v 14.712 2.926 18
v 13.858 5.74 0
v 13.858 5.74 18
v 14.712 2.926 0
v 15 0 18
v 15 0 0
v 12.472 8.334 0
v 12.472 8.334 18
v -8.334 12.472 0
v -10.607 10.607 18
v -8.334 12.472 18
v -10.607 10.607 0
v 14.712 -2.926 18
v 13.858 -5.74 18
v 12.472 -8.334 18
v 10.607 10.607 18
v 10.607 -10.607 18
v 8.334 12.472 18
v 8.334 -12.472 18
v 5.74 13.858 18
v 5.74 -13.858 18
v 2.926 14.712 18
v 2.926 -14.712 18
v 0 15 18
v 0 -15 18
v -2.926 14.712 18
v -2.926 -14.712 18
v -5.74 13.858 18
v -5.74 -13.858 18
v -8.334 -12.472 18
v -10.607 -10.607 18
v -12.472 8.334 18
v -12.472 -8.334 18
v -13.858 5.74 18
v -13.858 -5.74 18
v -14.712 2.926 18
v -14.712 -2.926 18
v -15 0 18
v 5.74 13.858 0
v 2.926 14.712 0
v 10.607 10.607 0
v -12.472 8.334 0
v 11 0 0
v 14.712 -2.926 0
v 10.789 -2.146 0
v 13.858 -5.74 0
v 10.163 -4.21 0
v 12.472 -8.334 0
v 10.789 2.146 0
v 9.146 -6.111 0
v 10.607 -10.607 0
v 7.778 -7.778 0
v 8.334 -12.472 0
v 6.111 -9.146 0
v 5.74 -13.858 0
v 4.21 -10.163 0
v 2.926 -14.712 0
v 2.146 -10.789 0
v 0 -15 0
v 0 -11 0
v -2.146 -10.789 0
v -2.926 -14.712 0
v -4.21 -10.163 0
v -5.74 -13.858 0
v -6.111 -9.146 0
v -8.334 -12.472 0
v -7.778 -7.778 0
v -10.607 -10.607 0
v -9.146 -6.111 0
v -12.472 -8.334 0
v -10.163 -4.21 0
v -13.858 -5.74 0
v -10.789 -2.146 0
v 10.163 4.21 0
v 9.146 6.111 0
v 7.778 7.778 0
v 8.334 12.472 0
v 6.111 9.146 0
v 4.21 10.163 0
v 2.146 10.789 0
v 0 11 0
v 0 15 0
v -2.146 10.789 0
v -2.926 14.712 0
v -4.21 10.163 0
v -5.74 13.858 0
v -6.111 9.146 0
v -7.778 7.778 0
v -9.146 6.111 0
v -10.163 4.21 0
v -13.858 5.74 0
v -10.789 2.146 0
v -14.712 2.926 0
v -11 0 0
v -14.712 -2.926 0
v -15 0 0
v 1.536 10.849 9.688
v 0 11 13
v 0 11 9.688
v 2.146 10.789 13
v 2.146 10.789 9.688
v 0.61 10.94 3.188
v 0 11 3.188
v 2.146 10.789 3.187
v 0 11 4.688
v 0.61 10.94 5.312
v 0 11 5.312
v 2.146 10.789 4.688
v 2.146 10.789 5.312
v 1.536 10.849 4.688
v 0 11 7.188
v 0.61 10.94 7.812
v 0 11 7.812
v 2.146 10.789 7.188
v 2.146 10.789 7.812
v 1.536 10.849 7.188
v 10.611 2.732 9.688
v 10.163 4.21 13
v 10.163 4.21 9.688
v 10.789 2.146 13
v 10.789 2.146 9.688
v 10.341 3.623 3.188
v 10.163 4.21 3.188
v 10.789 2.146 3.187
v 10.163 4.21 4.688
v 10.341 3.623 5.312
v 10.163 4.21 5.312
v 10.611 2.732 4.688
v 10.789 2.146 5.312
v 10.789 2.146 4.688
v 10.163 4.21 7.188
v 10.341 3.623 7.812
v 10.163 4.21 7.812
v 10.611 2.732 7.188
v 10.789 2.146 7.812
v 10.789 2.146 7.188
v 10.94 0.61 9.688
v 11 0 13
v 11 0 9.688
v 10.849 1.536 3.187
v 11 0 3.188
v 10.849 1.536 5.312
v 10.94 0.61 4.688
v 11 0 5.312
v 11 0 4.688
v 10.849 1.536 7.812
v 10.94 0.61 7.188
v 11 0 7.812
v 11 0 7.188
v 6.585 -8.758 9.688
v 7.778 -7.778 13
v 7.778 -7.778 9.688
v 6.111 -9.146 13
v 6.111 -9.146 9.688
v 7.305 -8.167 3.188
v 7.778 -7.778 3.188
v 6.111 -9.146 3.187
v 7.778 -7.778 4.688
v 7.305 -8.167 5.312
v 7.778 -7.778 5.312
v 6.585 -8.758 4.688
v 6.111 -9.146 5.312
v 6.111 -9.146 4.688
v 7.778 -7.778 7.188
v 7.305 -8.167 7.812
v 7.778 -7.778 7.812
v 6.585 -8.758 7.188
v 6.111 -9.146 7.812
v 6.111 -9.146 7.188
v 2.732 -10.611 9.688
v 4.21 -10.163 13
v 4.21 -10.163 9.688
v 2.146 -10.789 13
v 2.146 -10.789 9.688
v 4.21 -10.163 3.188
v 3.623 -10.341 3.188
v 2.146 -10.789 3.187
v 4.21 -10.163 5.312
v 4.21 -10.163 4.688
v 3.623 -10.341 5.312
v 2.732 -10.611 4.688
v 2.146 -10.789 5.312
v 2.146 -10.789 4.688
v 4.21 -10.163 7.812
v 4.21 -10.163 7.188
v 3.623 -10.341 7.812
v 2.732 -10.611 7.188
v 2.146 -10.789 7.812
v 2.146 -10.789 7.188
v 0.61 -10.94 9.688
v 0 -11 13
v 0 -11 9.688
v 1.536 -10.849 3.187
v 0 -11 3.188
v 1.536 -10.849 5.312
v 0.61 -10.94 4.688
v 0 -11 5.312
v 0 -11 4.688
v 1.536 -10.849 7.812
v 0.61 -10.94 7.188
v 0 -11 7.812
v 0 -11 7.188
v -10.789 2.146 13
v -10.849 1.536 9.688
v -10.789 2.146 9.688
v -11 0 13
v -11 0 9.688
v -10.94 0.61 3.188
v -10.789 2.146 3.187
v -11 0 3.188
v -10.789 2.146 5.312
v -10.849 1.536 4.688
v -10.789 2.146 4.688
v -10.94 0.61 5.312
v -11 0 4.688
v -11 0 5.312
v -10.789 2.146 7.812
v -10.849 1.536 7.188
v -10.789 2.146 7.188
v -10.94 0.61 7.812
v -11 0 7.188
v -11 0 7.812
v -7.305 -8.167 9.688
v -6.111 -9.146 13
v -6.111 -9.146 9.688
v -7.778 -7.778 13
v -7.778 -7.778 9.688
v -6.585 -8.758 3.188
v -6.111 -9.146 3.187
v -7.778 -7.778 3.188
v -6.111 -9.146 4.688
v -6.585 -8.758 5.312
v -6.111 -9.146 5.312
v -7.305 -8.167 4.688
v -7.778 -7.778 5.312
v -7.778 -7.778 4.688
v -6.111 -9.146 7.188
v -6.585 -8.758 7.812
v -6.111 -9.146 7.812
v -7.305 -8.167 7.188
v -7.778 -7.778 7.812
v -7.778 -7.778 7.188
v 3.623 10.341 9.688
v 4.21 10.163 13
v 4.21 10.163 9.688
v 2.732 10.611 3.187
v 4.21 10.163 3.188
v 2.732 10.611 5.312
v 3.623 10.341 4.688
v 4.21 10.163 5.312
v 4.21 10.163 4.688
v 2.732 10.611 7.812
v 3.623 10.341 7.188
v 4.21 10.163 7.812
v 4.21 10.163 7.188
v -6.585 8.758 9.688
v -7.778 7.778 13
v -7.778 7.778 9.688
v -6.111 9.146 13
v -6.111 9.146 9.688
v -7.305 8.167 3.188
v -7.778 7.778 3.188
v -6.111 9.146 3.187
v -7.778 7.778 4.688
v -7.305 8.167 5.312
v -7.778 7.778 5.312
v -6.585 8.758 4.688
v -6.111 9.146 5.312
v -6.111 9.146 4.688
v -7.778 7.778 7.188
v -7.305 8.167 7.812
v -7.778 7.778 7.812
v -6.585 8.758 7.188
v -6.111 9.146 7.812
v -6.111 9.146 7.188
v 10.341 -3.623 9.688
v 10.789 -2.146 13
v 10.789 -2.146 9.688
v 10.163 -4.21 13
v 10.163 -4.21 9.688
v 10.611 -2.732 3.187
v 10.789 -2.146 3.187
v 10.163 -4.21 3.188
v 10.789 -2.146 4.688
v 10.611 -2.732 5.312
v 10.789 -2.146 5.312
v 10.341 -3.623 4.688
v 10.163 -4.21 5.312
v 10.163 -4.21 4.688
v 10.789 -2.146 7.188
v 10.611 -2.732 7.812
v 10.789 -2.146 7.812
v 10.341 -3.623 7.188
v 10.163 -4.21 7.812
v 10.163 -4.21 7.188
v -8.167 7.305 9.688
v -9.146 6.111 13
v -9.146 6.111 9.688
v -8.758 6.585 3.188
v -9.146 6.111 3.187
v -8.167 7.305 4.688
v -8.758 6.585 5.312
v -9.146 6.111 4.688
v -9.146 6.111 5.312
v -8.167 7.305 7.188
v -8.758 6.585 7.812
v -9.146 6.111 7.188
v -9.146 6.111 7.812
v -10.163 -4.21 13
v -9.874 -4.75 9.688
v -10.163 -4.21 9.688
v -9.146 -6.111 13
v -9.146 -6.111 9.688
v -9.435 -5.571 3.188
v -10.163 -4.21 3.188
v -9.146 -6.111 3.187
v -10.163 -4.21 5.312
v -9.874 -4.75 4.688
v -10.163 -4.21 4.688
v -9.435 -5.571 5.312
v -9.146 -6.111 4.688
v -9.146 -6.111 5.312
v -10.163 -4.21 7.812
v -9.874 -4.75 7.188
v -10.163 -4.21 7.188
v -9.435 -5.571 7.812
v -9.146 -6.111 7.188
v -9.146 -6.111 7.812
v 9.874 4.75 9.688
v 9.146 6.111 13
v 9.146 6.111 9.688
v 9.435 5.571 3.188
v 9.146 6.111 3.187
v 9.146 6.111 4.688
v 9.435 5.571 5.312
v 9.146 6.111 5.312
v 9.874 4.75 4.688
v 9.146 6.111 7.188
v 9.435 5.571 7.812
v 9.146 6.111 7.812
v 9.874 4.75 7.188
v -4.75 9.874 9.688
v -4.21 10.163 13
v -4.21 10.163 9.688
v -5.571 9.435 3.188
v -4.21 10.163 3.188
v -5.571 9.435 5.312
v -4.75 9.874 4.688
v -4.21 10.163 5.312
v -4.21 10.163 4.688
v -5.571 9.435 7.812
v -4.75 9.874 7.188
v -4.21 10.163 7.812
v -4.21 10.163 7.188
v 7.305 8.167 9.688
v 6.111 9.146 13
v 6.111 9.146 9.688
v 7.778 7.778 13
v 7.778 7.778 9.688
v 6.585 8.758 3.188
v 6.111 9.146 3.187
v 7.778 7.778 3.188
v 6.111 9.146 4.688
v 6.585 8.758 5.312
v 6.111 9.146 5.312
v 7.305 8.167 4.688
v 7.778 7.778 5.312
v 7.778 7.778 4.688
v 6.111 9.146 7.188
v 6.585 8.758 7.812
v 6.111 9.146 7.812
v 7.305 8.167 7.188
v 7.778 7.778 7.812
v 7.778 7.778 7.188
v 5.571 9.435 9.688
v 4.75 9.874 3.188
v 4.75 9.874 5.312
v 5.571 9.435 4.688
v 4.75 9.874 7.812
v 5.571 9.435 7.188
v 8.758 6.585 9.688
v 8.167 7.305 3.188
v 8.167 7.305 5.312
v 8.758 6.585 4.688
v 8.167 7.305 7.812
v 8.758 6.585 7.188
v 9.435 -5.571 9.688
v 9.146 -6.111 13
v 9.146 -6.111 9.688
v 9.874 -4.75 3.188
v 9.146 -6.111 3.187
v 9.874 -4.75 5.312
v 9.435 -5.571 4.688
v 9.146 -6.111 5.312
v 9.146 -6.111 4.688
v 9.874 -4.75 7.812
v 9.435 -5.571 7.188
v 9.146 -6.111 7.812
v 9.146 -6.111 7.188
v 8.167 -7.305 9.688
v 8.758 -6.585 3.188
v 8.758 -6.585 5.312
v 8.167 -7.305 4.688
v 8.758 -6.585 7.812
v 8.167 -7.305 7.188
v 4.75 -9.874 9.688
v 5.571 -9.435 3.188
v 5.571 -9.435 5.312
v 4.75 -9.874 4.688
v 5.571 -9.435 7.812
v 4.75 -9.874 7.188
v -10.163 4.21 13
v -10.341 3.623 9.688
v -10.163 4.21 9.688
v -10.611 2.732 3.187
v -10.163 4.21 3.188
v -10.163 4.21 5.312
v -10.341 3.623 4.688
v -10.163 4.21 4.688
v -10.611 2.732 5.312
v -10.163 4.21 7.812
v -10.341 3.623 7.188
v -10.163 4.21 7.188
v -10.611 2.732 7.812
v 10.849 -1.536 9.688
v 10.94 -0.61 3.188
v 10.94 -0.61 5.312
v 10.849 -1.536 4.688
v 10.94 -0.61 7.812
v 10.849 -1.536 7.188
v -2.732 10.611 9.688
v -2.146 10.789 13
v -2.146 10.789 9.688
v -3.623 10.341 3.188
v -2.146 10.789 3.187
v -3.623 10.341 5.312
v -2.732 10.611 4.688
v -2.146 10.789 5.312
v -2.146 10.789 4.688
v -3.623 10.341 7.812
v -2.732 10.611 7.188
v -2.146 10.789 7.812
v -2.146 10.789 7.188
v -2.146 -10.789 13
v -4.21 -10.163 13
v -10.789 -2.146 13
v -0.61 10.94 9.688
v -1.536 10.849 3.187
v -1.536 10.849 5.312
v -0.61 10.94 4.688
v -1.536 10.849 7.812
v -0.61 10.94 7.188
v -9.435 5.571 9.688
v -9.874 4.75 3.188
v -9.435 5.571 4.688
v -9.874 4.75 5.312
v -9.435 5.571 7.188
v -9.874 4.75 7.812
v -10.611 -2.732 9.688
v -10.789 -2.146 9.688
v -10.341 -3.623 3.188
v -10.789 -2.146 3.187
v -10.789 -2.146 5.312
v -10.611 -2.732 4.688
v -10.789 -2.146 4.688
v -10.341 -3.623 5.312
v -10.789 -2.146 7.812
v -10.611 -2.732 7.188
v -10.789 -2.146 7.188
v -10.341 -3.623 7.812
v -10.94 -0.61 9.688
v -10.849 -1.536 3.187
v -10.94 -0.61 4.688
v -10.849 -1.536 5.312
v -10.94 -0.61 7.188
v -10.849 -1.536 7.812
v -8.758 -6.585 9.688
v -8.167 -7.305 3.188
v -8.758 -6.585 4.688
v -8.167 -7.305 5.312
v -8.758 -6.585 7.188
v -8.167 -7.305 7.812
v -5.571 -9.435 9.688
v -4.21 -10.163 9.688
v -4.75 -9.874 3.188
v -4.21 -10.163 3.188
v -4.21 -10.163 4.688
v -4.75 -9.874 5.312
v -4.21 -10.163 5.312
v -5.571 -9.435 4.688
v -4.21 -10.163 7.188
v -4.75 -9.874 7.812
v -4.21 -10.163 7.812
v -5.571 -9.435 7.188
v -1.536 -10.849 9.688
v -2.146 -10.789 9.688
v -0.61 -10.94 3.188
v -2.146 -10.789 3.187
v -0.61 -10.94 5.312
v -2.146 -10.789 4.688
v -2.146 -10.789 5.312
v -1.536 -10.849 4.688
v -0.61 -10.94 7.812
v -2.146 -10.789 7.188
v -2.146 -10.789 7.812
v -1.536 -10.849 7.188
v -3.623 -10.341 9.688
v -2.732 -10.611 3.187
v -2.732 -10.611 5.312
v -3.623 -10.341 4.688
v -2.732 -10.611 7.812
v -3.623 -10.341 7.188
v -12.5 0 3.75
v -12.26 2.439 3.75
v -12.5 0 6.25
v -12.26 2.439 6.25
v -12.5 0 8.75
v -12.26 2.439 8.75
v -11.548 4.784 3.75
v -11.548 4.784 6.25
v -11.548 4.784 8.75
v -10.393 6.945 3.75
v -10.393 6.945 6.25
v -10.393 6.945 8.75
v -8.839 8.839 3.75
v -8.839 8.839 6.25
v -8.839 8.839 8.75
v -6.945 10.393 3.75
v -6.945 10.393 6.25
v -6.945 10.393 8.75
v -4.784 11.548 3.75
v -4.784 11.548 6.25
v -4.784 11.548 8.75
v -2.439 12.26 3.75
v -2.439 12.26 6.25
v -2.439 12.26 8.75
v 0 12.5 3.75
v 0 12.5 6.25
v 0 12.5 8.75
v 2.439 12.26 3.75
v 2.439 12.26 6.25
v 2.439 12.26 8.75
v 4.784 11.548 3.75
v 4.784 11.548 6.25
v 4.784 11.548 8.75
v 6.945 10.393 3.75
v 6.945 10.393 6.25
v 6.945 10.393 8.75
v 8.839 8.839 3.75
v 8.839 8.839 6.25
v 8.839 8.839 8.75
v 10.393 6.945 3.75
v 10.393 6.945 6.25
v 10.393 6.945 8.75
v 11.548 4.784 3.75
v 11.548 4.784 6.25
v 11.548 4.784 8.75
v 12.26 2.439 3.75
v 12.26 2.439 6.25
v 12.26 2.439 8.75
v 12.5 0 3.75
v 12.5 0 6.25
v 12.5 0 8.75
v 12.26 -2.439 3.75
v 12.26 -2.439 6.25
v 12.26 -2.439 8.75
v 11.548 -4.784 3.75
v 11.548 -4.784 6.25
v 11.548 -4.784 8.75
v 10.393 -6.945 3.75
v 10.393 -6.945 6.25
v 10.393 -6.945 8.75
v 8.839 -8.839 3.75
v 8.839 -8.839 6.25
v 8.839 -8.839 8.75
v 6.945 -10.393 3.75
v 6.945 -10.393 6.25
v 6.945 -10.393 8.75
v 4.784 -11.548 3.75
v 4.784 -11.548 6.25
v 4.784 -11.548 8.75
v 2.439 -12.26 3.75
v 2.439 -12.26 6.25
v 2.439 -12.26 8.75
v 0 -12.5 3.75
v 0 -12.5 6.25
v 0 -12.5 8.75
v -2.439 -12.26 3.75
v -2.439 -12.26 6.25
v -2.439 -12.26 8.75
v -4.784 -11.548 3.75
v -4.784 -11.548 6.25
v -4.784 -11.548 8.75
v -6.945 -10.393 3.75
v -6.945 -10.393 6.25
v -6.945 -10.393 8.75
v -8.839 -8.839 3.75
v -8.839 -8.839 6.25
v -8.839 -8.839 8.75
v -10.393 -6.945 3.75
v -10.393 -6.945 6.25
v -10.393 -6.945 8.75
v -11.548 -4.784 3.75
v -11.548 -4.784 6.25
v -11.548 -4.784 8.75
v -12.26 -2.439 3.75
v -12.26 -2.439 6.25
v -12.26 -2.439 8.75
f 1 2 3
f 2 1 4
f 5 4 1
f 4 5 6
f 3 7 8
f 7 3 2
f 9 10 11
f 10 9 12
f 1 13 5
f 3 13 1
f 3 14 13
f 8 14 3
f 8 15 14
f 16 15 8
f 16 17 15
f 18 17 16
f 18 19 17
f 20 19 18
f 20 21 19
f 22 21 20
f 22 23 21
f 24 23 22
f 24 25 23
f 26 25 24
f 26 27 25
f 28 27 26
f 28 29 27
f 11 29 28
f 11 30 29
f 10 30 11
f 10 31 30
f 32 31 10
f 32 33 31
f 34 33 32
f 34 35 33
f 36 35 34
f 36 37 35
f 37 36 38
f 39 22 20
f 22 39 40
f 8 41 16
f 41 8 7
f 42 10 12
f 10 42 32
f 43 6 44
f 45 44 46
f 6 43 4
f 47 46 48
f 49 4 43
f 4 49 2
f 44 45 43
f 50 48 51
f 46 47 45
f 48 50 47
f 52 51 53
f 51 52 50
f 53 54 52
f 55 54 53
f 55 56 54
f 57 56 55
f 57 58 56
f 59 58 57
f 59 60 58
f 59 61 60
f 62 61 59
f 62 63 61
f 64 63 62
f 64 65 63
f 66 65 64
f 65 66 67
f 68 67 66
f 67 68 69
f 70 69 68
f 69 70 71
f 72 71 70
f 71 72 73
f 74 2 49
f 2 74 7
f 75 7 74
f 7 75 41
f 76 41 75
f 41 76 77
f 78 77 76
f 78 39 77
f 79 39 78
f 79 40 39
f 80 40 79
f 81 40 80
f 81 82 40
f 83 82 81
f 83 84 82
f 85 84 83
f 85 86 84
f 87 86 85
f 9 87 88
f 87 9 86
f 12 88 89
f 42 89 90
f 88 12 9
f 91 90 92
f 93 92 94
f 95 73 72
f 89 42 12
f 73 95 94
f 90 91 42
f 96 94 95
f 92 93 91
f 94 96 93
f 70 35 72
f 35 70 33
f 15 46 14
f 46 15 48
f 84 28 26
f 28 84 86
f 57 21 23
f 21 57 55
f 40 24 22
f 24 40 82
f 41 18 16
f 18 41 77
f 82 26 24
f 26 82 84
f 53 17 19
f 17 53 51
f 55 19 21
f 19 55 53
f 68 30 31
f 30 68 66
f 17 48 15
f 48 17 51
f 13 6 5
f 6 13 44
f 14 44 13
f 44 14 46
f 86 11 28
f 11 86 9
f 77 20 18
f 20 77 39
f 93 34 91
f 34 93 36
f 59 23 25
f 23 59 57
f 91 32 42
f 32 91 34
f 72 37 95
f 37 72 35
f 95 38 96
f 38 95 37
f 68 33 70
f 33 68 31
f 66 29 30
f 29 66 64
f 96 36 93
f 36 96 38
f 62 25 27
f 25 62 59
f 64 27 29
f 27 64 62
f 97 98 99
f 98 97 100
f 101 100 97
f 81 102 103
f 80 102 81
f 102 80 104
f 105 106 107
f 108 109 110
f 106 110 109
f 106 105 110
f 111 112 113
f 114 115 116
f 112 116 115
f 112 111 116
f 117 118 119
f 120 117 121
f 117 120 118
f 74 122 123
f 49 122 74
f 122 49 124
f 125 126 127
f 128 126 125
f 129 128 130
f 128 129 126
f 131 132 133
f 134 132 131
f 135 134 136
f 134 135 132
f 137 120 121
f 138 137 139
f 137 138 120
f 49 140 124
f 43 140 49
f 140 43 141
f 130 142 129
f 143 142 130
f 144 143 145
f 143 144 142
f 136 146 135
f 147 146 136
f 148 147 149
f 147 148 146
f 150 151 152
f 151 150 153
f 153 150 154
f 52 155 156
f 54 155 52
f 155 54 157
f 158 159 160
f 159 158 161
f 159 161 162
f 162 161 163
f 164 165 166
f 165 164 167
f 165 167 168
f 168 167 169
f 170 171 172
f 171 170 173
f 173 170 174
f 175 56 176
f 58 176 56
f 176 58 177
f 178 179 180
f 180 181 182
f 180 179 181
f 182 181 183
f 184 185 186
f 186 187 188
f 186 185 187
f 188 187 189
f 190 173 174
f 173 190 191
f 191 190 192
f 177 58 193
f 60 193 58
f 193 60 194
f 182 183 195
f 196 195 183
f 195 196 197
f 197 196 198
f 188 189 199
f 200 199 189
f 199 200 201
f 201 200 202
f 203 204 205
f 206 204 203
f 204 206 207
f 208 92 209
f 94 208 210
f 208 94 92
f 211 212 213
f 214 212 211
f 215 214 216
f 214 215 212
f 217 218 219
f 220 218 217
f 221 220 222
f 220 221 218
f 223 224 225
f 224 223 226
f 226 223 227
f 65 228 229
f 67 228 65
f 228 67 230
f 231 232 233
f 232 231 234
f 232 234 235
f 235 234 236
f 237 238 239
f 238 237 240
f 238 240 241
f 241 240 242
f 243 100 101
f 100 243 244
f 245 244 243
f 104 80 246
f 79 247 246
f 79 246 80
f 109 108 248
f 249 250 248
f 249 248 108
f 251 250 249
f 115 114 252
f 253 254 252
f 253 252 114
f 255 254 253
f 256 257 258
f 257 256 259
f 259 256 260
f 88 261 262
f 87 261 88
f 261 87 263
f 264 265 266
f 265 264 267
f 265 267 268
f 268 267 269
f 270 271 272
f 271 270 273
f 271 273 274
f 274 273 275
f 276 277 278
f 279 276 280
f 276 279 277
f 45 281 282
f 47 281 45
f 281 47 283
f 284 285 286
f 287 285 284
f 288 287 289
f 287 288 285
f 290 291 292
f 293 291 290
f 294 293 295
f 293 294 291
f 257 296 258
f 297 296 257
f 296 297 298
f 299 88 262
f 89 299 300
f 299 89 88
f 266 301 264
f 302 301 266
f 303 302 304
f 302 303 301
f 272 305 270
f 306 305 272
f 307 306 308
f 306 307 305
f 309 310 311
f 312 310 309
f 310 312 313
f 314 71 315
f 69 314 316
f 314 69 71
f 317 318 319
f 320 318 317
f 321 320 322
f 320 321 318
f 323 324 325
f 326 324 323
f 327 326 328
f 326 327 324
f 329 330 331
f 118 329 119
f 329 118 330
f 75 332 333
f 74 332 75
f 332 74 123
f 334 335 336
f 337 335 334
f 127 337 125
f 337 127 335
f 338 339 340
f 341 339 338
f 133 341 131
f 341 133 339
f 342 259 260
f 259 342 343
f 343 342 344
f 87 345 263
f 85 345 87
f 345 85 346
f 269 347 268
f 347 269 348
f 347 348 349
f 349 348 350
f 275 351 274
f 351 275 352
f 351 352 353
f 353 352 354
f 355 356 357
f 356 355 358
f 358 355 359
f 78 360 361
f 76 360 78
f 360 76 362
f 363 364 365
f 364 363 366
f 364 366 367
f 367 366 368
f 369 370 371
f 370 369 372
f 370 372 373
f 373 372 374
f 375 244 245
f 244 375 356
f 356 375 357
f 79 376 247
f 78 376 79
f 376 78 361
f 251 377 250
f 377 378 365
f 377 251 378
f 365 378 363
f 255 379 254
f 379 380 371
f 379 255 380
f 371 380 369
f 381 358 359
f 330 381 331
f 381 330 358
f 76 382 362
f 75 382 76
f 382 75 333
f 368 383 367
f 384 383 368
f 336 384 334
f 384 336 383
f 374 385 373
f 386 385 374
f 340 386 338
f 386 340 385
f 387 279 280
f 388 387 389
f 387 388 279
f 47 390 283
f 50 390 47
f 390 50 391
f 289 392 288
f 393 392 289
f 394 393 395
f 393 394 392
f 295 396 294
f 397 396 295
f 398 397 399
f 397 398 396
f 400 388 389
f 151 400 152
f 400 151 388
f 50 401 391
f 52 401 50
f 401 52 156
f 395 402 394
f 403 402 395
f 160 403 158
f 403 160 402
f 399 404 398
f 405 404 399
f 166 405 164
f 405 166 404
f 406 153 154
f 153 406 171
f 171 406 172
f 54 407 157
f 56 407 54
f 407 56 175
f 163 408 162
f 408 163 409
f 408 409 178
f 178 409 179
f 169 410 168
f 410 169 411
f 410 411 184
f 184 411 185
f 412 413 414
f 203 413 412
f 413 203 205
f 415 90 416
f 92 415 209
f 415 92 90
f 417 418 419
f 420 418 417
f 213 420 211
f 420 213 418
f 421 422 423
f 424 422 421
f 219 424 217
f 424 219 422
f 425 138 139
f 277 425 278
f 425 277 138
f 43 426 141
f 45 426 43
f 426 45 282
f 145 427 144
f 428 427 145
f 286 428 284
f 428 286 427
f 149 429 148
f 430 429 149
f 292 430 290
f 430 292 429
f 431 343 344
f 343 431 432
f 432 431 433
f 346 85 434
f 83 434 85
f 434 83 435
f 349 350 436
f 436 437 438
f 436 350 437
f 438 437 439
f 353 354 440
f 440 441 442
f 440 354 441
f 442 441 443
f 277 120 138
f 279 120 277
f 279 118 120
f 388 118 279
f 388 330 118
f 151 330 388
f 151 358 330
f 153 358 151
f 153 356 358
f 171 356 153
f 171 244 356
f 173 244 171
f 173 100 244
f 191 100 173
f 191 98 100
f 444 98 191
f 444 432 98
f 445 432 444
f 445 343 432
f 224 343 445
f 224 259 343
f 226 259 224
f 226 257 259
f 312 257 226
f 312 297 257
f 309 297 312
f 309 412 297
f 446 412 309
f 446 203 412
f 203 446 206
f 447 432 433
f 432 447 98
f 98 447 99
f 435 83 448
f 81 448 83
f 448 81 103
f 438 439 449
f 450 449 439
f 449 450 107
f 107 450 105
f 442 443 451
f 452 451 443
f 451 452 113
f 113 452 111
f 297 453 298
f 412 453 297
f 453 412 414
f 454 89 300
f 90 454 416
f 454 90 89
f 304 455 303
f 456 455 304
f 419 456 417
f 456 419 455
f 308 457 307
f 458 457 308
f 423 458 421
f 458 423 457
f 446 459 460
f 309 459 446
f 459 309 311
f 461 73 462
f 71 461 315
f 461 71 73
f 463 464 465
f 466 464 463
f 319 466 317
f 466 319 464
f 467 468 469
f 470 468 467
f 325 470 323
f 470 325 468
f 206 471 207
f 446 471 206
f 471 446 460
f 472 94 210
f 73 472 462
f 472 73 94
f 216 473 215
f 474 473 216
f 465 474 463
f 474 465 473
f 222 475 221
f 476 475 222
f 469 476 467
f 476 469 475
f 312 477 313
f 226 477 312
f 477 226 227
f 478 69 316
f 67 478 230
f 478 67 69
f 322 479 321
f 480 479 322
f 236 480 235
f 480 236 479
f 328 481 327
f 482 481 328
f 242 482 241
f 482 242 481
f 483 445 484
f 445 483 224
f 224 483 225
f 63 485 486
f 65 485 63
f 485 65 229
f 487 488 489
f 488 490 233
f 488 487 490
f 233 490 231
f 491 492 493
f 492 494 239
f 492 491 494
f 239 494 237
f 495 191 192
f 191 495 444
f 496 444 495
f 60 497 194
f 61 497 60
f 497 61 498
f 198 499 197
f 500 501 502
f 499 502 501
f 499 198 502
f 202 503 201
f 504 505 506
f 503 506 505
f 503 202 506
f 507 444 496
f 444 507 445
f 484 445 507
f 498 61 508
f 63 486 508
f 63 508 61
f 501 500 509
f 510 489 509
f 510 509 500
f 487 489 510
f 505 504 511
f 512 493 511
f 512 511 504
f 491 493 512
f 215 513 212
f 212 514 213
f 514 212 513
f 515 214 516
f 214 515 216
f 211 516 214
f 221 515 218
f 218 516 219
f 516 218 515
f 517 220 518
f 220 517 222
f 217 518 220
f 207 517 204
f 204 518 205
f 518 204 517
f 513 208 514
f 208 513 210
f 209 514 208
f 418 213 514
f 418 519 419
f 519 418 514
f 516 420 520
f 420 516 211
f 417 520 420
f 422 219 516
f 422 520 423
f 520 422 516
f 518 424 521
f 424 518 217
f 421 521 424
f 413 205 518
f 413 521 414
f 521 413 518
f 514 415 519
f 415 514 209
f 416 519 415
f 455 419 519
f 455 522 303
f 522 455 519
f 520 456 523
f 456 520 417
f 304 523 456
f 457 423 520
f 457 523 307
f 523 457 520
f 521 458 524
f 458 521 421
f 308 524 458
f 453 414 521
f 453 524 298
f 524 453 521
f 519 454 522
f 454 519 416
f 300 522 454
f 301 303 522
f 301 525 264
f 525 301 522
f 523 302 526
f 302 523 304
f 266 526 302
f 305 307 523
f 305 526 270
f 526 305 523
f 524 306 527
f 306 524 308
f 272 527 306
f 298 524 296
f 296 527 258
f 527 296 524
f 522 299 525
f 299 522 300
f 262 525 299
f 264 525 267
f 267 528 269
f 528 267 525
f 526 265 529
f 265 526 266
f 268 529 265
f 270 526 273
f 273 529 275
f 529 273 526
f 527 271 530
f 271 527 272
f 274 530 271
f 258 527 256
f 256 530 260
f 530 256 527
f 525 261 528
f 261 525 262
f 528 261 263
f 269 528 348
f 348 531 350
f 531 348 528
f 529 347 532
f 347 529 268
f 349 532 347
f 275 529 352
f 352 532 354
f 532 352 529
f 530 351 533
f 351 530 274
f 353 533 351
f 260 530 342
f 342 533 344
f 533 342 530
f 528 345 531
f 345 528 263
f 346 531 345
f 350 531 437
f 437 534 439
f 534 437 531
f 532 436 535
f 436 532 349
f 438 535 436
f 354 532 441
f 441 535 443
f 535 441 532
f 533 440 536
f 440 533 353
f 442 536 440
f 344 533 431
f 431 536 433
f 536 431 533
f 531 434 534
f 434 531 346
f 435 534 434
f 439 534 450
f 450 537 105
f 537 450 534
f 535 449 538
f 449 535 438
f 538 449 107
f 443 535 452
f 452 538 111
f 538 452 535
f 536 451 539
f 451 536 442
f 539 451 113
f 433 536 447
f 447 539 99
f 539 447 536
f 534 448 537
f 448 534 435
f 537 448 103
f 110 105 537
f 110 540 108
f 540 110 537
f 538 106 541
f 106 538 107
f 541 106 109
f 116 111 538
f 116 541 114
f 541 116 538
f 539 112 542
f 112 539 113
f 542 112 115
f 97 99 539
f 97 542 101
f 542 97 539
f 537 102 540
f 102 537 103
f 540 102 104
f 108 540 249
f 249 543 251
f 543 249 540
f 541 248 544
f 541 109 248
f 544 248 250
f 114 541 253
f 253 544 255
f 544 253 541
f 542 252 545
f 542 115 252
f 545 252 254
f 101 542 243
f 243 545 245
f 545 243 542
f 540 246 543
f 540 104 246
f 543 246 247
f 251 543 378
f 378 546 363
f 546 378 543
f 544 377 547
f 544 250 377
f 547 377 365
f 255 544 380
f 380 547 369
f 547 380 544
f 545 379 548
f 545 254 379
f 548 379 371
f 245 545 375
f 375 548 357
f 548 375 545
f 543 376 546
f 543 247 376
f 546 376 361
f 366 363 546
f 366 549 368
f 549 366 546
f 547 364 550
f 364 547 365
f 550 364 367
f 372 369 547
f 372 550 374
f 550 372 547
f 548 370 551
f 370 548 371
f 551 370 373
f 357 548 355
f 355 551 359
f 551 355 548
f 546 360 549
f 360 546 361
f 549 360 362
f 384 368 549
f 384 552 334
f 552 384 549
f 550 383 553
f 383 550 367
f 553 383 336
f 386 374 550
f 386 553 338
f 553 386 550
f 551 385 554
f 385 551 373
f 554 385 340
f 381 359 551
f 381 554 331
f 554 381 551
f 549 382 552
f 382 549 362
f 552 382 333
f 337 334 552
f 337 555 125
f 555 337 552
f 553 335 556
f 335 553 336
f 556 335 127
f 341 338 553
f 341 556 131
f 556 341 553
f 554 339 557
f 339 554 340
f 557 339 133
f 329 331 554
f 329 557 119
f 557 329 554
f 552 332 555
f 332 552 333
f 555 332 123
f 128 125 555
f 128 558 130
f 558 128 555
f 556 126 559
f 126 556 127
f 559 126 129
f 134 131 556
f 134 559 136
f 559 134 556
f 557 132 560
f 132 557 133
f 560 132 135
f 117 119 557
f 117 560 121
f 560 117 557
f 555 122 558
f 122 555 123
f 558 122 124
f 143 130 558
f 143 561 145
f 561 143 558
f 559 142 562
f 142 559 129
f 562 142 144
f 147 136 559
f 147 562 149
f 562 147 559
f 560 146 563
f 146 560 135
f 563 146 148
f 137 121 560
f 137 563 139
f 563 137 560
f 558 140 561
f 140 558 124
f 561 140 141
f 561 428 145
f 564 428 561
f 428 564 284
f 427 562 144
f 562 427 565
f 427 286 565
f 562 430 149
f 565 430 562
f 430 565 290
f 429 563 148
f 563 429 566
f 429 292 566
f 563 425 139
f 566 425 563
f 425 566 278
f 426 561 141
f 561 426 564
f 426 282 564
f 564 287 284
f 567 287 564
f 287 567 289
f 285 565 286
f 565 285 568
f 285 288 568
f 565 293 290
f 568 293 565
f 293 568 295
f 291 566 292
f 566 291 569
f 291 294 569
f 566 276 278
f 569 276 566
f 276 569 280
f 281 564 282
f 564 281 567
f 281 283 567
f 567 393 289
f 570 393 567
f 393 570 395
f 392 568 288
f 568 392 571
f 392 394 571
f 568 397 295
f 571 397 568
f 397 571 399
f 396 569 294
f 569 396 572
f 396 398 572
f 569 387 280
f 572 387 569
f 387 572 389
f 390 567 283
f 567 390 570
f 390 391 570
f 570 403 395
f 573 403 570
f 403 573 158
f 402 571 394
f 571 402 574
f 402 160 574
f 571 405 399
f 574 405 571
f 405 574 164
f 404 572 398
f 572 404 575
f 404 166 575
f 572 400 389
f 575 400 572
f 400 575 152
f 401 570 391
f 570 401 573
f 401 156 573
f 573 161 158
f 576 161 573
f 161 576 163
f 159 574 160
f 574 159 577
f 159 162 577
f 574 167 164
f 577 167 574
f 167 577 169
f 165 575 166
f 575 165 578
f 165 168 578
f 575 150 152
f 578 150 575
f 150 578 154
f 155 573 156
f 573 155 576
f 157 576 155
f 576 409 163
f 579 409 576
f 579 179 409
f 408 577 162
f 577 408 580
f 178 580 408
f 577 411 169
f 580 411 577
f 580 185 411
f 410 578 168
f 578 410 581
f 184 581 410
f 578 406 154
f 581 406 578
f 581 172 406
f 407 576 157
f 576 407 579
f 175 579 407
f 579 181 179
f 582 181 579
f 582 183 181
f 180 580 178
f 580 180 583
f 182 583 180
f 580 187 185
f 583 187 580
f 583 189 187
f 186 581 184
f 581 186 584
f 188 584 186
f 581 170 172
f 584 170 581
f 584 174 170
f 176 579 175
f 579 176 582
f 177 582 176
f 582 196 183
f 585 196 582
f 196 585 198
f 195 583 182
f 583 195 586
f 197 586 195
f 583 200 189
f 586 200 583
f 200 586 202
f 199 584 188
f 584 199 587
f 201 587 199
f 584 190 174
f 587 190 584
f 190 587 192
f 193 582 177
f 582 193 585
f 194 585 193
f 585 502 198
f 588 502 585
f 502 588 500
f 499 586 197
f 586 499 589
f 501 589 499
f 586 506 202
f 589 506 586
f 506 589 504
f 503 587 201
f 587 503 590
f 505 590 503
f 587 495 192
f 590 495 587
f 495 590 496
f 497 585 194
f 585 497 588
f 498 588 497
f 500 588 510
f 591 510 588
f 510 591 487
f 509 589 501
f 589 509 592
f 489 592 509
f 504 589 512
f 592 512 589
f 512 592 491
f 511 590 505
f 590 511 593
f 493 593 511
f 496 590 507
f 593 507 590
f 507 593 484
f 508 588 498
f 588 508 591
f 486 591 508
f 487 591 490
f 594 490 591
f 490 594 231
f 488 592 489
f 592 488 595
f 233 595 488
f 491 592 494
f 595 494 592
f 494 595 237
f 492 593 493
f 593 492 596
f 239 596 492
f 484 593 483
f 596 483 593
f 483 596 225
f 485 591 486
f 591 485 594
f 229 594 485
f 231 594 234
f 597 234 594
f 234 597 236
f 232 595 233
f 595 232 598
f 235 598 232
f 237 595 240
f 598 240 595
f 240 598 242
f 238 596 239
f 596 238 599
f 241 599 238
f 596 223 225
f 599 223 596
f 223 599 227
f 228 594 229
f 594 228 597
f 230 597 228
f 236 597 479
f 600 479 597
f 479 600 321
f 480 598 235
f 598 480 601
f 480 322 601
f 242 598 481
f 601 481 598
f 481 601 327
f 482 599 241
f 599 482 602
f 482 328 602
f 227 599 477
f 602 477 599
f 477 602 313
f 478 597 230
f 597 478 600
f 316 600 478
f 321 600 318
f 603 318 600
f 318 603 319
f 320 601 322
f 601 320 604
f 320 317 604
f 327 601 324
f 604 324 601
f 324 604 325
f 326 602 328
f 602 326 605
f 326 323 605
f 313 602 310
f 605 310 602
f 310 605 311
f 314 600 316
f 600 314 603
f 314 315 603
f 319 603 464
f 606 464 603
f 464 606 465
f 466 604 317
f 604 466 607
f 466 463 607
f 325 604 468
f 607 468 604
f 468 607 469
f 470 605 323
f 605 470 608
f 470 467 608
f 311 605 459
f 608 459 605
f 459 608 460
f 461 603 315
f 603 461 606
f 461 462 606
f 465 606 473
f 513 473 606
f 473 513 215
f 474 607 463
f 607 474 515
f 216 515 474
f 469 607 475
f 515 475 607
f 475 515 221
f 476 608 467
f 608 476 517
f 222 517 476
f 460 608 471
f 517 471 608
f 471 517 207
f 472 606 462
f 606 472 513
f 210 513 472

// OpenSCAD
$fn = 32;

// ----------------------------------------------------------------------
// Threaded cap: 30 mm body, 18 mm tall, 22 mm threaded bore
// ----------------------------------------------------------------------

// --- parameters (mm) ---
outer_d = 30;             // cap outside diameter
body_h = 18;              // cap height
top_t = 5;                // closed top thickness
bore_d = 22;              // bore core diameter
pitch = 2.5;              // thread pitch
thread_d = 1.5;           // thread depth
thread_z = 3;             // thread start above the rim
thread_h = 7;             // threaded height

difference() {
  union() {
    cylinder(h = 18, d = outer_d);
  }
  /* threaded bore, closed at the top */
  translate([0, 0, -2.5]) cylinder(h = 15.5, d = bore_d);
  translate([0, 0, 3]) rotate_extrude() polygon([[10, 0], [10, 7], [10.5, 7], [12.5, 5.75], [10.5, 4.5], [12.5, 3.25], [10.5, 2], [12.5, 0.75], [10.5, 0], [10, 0]]);
}
